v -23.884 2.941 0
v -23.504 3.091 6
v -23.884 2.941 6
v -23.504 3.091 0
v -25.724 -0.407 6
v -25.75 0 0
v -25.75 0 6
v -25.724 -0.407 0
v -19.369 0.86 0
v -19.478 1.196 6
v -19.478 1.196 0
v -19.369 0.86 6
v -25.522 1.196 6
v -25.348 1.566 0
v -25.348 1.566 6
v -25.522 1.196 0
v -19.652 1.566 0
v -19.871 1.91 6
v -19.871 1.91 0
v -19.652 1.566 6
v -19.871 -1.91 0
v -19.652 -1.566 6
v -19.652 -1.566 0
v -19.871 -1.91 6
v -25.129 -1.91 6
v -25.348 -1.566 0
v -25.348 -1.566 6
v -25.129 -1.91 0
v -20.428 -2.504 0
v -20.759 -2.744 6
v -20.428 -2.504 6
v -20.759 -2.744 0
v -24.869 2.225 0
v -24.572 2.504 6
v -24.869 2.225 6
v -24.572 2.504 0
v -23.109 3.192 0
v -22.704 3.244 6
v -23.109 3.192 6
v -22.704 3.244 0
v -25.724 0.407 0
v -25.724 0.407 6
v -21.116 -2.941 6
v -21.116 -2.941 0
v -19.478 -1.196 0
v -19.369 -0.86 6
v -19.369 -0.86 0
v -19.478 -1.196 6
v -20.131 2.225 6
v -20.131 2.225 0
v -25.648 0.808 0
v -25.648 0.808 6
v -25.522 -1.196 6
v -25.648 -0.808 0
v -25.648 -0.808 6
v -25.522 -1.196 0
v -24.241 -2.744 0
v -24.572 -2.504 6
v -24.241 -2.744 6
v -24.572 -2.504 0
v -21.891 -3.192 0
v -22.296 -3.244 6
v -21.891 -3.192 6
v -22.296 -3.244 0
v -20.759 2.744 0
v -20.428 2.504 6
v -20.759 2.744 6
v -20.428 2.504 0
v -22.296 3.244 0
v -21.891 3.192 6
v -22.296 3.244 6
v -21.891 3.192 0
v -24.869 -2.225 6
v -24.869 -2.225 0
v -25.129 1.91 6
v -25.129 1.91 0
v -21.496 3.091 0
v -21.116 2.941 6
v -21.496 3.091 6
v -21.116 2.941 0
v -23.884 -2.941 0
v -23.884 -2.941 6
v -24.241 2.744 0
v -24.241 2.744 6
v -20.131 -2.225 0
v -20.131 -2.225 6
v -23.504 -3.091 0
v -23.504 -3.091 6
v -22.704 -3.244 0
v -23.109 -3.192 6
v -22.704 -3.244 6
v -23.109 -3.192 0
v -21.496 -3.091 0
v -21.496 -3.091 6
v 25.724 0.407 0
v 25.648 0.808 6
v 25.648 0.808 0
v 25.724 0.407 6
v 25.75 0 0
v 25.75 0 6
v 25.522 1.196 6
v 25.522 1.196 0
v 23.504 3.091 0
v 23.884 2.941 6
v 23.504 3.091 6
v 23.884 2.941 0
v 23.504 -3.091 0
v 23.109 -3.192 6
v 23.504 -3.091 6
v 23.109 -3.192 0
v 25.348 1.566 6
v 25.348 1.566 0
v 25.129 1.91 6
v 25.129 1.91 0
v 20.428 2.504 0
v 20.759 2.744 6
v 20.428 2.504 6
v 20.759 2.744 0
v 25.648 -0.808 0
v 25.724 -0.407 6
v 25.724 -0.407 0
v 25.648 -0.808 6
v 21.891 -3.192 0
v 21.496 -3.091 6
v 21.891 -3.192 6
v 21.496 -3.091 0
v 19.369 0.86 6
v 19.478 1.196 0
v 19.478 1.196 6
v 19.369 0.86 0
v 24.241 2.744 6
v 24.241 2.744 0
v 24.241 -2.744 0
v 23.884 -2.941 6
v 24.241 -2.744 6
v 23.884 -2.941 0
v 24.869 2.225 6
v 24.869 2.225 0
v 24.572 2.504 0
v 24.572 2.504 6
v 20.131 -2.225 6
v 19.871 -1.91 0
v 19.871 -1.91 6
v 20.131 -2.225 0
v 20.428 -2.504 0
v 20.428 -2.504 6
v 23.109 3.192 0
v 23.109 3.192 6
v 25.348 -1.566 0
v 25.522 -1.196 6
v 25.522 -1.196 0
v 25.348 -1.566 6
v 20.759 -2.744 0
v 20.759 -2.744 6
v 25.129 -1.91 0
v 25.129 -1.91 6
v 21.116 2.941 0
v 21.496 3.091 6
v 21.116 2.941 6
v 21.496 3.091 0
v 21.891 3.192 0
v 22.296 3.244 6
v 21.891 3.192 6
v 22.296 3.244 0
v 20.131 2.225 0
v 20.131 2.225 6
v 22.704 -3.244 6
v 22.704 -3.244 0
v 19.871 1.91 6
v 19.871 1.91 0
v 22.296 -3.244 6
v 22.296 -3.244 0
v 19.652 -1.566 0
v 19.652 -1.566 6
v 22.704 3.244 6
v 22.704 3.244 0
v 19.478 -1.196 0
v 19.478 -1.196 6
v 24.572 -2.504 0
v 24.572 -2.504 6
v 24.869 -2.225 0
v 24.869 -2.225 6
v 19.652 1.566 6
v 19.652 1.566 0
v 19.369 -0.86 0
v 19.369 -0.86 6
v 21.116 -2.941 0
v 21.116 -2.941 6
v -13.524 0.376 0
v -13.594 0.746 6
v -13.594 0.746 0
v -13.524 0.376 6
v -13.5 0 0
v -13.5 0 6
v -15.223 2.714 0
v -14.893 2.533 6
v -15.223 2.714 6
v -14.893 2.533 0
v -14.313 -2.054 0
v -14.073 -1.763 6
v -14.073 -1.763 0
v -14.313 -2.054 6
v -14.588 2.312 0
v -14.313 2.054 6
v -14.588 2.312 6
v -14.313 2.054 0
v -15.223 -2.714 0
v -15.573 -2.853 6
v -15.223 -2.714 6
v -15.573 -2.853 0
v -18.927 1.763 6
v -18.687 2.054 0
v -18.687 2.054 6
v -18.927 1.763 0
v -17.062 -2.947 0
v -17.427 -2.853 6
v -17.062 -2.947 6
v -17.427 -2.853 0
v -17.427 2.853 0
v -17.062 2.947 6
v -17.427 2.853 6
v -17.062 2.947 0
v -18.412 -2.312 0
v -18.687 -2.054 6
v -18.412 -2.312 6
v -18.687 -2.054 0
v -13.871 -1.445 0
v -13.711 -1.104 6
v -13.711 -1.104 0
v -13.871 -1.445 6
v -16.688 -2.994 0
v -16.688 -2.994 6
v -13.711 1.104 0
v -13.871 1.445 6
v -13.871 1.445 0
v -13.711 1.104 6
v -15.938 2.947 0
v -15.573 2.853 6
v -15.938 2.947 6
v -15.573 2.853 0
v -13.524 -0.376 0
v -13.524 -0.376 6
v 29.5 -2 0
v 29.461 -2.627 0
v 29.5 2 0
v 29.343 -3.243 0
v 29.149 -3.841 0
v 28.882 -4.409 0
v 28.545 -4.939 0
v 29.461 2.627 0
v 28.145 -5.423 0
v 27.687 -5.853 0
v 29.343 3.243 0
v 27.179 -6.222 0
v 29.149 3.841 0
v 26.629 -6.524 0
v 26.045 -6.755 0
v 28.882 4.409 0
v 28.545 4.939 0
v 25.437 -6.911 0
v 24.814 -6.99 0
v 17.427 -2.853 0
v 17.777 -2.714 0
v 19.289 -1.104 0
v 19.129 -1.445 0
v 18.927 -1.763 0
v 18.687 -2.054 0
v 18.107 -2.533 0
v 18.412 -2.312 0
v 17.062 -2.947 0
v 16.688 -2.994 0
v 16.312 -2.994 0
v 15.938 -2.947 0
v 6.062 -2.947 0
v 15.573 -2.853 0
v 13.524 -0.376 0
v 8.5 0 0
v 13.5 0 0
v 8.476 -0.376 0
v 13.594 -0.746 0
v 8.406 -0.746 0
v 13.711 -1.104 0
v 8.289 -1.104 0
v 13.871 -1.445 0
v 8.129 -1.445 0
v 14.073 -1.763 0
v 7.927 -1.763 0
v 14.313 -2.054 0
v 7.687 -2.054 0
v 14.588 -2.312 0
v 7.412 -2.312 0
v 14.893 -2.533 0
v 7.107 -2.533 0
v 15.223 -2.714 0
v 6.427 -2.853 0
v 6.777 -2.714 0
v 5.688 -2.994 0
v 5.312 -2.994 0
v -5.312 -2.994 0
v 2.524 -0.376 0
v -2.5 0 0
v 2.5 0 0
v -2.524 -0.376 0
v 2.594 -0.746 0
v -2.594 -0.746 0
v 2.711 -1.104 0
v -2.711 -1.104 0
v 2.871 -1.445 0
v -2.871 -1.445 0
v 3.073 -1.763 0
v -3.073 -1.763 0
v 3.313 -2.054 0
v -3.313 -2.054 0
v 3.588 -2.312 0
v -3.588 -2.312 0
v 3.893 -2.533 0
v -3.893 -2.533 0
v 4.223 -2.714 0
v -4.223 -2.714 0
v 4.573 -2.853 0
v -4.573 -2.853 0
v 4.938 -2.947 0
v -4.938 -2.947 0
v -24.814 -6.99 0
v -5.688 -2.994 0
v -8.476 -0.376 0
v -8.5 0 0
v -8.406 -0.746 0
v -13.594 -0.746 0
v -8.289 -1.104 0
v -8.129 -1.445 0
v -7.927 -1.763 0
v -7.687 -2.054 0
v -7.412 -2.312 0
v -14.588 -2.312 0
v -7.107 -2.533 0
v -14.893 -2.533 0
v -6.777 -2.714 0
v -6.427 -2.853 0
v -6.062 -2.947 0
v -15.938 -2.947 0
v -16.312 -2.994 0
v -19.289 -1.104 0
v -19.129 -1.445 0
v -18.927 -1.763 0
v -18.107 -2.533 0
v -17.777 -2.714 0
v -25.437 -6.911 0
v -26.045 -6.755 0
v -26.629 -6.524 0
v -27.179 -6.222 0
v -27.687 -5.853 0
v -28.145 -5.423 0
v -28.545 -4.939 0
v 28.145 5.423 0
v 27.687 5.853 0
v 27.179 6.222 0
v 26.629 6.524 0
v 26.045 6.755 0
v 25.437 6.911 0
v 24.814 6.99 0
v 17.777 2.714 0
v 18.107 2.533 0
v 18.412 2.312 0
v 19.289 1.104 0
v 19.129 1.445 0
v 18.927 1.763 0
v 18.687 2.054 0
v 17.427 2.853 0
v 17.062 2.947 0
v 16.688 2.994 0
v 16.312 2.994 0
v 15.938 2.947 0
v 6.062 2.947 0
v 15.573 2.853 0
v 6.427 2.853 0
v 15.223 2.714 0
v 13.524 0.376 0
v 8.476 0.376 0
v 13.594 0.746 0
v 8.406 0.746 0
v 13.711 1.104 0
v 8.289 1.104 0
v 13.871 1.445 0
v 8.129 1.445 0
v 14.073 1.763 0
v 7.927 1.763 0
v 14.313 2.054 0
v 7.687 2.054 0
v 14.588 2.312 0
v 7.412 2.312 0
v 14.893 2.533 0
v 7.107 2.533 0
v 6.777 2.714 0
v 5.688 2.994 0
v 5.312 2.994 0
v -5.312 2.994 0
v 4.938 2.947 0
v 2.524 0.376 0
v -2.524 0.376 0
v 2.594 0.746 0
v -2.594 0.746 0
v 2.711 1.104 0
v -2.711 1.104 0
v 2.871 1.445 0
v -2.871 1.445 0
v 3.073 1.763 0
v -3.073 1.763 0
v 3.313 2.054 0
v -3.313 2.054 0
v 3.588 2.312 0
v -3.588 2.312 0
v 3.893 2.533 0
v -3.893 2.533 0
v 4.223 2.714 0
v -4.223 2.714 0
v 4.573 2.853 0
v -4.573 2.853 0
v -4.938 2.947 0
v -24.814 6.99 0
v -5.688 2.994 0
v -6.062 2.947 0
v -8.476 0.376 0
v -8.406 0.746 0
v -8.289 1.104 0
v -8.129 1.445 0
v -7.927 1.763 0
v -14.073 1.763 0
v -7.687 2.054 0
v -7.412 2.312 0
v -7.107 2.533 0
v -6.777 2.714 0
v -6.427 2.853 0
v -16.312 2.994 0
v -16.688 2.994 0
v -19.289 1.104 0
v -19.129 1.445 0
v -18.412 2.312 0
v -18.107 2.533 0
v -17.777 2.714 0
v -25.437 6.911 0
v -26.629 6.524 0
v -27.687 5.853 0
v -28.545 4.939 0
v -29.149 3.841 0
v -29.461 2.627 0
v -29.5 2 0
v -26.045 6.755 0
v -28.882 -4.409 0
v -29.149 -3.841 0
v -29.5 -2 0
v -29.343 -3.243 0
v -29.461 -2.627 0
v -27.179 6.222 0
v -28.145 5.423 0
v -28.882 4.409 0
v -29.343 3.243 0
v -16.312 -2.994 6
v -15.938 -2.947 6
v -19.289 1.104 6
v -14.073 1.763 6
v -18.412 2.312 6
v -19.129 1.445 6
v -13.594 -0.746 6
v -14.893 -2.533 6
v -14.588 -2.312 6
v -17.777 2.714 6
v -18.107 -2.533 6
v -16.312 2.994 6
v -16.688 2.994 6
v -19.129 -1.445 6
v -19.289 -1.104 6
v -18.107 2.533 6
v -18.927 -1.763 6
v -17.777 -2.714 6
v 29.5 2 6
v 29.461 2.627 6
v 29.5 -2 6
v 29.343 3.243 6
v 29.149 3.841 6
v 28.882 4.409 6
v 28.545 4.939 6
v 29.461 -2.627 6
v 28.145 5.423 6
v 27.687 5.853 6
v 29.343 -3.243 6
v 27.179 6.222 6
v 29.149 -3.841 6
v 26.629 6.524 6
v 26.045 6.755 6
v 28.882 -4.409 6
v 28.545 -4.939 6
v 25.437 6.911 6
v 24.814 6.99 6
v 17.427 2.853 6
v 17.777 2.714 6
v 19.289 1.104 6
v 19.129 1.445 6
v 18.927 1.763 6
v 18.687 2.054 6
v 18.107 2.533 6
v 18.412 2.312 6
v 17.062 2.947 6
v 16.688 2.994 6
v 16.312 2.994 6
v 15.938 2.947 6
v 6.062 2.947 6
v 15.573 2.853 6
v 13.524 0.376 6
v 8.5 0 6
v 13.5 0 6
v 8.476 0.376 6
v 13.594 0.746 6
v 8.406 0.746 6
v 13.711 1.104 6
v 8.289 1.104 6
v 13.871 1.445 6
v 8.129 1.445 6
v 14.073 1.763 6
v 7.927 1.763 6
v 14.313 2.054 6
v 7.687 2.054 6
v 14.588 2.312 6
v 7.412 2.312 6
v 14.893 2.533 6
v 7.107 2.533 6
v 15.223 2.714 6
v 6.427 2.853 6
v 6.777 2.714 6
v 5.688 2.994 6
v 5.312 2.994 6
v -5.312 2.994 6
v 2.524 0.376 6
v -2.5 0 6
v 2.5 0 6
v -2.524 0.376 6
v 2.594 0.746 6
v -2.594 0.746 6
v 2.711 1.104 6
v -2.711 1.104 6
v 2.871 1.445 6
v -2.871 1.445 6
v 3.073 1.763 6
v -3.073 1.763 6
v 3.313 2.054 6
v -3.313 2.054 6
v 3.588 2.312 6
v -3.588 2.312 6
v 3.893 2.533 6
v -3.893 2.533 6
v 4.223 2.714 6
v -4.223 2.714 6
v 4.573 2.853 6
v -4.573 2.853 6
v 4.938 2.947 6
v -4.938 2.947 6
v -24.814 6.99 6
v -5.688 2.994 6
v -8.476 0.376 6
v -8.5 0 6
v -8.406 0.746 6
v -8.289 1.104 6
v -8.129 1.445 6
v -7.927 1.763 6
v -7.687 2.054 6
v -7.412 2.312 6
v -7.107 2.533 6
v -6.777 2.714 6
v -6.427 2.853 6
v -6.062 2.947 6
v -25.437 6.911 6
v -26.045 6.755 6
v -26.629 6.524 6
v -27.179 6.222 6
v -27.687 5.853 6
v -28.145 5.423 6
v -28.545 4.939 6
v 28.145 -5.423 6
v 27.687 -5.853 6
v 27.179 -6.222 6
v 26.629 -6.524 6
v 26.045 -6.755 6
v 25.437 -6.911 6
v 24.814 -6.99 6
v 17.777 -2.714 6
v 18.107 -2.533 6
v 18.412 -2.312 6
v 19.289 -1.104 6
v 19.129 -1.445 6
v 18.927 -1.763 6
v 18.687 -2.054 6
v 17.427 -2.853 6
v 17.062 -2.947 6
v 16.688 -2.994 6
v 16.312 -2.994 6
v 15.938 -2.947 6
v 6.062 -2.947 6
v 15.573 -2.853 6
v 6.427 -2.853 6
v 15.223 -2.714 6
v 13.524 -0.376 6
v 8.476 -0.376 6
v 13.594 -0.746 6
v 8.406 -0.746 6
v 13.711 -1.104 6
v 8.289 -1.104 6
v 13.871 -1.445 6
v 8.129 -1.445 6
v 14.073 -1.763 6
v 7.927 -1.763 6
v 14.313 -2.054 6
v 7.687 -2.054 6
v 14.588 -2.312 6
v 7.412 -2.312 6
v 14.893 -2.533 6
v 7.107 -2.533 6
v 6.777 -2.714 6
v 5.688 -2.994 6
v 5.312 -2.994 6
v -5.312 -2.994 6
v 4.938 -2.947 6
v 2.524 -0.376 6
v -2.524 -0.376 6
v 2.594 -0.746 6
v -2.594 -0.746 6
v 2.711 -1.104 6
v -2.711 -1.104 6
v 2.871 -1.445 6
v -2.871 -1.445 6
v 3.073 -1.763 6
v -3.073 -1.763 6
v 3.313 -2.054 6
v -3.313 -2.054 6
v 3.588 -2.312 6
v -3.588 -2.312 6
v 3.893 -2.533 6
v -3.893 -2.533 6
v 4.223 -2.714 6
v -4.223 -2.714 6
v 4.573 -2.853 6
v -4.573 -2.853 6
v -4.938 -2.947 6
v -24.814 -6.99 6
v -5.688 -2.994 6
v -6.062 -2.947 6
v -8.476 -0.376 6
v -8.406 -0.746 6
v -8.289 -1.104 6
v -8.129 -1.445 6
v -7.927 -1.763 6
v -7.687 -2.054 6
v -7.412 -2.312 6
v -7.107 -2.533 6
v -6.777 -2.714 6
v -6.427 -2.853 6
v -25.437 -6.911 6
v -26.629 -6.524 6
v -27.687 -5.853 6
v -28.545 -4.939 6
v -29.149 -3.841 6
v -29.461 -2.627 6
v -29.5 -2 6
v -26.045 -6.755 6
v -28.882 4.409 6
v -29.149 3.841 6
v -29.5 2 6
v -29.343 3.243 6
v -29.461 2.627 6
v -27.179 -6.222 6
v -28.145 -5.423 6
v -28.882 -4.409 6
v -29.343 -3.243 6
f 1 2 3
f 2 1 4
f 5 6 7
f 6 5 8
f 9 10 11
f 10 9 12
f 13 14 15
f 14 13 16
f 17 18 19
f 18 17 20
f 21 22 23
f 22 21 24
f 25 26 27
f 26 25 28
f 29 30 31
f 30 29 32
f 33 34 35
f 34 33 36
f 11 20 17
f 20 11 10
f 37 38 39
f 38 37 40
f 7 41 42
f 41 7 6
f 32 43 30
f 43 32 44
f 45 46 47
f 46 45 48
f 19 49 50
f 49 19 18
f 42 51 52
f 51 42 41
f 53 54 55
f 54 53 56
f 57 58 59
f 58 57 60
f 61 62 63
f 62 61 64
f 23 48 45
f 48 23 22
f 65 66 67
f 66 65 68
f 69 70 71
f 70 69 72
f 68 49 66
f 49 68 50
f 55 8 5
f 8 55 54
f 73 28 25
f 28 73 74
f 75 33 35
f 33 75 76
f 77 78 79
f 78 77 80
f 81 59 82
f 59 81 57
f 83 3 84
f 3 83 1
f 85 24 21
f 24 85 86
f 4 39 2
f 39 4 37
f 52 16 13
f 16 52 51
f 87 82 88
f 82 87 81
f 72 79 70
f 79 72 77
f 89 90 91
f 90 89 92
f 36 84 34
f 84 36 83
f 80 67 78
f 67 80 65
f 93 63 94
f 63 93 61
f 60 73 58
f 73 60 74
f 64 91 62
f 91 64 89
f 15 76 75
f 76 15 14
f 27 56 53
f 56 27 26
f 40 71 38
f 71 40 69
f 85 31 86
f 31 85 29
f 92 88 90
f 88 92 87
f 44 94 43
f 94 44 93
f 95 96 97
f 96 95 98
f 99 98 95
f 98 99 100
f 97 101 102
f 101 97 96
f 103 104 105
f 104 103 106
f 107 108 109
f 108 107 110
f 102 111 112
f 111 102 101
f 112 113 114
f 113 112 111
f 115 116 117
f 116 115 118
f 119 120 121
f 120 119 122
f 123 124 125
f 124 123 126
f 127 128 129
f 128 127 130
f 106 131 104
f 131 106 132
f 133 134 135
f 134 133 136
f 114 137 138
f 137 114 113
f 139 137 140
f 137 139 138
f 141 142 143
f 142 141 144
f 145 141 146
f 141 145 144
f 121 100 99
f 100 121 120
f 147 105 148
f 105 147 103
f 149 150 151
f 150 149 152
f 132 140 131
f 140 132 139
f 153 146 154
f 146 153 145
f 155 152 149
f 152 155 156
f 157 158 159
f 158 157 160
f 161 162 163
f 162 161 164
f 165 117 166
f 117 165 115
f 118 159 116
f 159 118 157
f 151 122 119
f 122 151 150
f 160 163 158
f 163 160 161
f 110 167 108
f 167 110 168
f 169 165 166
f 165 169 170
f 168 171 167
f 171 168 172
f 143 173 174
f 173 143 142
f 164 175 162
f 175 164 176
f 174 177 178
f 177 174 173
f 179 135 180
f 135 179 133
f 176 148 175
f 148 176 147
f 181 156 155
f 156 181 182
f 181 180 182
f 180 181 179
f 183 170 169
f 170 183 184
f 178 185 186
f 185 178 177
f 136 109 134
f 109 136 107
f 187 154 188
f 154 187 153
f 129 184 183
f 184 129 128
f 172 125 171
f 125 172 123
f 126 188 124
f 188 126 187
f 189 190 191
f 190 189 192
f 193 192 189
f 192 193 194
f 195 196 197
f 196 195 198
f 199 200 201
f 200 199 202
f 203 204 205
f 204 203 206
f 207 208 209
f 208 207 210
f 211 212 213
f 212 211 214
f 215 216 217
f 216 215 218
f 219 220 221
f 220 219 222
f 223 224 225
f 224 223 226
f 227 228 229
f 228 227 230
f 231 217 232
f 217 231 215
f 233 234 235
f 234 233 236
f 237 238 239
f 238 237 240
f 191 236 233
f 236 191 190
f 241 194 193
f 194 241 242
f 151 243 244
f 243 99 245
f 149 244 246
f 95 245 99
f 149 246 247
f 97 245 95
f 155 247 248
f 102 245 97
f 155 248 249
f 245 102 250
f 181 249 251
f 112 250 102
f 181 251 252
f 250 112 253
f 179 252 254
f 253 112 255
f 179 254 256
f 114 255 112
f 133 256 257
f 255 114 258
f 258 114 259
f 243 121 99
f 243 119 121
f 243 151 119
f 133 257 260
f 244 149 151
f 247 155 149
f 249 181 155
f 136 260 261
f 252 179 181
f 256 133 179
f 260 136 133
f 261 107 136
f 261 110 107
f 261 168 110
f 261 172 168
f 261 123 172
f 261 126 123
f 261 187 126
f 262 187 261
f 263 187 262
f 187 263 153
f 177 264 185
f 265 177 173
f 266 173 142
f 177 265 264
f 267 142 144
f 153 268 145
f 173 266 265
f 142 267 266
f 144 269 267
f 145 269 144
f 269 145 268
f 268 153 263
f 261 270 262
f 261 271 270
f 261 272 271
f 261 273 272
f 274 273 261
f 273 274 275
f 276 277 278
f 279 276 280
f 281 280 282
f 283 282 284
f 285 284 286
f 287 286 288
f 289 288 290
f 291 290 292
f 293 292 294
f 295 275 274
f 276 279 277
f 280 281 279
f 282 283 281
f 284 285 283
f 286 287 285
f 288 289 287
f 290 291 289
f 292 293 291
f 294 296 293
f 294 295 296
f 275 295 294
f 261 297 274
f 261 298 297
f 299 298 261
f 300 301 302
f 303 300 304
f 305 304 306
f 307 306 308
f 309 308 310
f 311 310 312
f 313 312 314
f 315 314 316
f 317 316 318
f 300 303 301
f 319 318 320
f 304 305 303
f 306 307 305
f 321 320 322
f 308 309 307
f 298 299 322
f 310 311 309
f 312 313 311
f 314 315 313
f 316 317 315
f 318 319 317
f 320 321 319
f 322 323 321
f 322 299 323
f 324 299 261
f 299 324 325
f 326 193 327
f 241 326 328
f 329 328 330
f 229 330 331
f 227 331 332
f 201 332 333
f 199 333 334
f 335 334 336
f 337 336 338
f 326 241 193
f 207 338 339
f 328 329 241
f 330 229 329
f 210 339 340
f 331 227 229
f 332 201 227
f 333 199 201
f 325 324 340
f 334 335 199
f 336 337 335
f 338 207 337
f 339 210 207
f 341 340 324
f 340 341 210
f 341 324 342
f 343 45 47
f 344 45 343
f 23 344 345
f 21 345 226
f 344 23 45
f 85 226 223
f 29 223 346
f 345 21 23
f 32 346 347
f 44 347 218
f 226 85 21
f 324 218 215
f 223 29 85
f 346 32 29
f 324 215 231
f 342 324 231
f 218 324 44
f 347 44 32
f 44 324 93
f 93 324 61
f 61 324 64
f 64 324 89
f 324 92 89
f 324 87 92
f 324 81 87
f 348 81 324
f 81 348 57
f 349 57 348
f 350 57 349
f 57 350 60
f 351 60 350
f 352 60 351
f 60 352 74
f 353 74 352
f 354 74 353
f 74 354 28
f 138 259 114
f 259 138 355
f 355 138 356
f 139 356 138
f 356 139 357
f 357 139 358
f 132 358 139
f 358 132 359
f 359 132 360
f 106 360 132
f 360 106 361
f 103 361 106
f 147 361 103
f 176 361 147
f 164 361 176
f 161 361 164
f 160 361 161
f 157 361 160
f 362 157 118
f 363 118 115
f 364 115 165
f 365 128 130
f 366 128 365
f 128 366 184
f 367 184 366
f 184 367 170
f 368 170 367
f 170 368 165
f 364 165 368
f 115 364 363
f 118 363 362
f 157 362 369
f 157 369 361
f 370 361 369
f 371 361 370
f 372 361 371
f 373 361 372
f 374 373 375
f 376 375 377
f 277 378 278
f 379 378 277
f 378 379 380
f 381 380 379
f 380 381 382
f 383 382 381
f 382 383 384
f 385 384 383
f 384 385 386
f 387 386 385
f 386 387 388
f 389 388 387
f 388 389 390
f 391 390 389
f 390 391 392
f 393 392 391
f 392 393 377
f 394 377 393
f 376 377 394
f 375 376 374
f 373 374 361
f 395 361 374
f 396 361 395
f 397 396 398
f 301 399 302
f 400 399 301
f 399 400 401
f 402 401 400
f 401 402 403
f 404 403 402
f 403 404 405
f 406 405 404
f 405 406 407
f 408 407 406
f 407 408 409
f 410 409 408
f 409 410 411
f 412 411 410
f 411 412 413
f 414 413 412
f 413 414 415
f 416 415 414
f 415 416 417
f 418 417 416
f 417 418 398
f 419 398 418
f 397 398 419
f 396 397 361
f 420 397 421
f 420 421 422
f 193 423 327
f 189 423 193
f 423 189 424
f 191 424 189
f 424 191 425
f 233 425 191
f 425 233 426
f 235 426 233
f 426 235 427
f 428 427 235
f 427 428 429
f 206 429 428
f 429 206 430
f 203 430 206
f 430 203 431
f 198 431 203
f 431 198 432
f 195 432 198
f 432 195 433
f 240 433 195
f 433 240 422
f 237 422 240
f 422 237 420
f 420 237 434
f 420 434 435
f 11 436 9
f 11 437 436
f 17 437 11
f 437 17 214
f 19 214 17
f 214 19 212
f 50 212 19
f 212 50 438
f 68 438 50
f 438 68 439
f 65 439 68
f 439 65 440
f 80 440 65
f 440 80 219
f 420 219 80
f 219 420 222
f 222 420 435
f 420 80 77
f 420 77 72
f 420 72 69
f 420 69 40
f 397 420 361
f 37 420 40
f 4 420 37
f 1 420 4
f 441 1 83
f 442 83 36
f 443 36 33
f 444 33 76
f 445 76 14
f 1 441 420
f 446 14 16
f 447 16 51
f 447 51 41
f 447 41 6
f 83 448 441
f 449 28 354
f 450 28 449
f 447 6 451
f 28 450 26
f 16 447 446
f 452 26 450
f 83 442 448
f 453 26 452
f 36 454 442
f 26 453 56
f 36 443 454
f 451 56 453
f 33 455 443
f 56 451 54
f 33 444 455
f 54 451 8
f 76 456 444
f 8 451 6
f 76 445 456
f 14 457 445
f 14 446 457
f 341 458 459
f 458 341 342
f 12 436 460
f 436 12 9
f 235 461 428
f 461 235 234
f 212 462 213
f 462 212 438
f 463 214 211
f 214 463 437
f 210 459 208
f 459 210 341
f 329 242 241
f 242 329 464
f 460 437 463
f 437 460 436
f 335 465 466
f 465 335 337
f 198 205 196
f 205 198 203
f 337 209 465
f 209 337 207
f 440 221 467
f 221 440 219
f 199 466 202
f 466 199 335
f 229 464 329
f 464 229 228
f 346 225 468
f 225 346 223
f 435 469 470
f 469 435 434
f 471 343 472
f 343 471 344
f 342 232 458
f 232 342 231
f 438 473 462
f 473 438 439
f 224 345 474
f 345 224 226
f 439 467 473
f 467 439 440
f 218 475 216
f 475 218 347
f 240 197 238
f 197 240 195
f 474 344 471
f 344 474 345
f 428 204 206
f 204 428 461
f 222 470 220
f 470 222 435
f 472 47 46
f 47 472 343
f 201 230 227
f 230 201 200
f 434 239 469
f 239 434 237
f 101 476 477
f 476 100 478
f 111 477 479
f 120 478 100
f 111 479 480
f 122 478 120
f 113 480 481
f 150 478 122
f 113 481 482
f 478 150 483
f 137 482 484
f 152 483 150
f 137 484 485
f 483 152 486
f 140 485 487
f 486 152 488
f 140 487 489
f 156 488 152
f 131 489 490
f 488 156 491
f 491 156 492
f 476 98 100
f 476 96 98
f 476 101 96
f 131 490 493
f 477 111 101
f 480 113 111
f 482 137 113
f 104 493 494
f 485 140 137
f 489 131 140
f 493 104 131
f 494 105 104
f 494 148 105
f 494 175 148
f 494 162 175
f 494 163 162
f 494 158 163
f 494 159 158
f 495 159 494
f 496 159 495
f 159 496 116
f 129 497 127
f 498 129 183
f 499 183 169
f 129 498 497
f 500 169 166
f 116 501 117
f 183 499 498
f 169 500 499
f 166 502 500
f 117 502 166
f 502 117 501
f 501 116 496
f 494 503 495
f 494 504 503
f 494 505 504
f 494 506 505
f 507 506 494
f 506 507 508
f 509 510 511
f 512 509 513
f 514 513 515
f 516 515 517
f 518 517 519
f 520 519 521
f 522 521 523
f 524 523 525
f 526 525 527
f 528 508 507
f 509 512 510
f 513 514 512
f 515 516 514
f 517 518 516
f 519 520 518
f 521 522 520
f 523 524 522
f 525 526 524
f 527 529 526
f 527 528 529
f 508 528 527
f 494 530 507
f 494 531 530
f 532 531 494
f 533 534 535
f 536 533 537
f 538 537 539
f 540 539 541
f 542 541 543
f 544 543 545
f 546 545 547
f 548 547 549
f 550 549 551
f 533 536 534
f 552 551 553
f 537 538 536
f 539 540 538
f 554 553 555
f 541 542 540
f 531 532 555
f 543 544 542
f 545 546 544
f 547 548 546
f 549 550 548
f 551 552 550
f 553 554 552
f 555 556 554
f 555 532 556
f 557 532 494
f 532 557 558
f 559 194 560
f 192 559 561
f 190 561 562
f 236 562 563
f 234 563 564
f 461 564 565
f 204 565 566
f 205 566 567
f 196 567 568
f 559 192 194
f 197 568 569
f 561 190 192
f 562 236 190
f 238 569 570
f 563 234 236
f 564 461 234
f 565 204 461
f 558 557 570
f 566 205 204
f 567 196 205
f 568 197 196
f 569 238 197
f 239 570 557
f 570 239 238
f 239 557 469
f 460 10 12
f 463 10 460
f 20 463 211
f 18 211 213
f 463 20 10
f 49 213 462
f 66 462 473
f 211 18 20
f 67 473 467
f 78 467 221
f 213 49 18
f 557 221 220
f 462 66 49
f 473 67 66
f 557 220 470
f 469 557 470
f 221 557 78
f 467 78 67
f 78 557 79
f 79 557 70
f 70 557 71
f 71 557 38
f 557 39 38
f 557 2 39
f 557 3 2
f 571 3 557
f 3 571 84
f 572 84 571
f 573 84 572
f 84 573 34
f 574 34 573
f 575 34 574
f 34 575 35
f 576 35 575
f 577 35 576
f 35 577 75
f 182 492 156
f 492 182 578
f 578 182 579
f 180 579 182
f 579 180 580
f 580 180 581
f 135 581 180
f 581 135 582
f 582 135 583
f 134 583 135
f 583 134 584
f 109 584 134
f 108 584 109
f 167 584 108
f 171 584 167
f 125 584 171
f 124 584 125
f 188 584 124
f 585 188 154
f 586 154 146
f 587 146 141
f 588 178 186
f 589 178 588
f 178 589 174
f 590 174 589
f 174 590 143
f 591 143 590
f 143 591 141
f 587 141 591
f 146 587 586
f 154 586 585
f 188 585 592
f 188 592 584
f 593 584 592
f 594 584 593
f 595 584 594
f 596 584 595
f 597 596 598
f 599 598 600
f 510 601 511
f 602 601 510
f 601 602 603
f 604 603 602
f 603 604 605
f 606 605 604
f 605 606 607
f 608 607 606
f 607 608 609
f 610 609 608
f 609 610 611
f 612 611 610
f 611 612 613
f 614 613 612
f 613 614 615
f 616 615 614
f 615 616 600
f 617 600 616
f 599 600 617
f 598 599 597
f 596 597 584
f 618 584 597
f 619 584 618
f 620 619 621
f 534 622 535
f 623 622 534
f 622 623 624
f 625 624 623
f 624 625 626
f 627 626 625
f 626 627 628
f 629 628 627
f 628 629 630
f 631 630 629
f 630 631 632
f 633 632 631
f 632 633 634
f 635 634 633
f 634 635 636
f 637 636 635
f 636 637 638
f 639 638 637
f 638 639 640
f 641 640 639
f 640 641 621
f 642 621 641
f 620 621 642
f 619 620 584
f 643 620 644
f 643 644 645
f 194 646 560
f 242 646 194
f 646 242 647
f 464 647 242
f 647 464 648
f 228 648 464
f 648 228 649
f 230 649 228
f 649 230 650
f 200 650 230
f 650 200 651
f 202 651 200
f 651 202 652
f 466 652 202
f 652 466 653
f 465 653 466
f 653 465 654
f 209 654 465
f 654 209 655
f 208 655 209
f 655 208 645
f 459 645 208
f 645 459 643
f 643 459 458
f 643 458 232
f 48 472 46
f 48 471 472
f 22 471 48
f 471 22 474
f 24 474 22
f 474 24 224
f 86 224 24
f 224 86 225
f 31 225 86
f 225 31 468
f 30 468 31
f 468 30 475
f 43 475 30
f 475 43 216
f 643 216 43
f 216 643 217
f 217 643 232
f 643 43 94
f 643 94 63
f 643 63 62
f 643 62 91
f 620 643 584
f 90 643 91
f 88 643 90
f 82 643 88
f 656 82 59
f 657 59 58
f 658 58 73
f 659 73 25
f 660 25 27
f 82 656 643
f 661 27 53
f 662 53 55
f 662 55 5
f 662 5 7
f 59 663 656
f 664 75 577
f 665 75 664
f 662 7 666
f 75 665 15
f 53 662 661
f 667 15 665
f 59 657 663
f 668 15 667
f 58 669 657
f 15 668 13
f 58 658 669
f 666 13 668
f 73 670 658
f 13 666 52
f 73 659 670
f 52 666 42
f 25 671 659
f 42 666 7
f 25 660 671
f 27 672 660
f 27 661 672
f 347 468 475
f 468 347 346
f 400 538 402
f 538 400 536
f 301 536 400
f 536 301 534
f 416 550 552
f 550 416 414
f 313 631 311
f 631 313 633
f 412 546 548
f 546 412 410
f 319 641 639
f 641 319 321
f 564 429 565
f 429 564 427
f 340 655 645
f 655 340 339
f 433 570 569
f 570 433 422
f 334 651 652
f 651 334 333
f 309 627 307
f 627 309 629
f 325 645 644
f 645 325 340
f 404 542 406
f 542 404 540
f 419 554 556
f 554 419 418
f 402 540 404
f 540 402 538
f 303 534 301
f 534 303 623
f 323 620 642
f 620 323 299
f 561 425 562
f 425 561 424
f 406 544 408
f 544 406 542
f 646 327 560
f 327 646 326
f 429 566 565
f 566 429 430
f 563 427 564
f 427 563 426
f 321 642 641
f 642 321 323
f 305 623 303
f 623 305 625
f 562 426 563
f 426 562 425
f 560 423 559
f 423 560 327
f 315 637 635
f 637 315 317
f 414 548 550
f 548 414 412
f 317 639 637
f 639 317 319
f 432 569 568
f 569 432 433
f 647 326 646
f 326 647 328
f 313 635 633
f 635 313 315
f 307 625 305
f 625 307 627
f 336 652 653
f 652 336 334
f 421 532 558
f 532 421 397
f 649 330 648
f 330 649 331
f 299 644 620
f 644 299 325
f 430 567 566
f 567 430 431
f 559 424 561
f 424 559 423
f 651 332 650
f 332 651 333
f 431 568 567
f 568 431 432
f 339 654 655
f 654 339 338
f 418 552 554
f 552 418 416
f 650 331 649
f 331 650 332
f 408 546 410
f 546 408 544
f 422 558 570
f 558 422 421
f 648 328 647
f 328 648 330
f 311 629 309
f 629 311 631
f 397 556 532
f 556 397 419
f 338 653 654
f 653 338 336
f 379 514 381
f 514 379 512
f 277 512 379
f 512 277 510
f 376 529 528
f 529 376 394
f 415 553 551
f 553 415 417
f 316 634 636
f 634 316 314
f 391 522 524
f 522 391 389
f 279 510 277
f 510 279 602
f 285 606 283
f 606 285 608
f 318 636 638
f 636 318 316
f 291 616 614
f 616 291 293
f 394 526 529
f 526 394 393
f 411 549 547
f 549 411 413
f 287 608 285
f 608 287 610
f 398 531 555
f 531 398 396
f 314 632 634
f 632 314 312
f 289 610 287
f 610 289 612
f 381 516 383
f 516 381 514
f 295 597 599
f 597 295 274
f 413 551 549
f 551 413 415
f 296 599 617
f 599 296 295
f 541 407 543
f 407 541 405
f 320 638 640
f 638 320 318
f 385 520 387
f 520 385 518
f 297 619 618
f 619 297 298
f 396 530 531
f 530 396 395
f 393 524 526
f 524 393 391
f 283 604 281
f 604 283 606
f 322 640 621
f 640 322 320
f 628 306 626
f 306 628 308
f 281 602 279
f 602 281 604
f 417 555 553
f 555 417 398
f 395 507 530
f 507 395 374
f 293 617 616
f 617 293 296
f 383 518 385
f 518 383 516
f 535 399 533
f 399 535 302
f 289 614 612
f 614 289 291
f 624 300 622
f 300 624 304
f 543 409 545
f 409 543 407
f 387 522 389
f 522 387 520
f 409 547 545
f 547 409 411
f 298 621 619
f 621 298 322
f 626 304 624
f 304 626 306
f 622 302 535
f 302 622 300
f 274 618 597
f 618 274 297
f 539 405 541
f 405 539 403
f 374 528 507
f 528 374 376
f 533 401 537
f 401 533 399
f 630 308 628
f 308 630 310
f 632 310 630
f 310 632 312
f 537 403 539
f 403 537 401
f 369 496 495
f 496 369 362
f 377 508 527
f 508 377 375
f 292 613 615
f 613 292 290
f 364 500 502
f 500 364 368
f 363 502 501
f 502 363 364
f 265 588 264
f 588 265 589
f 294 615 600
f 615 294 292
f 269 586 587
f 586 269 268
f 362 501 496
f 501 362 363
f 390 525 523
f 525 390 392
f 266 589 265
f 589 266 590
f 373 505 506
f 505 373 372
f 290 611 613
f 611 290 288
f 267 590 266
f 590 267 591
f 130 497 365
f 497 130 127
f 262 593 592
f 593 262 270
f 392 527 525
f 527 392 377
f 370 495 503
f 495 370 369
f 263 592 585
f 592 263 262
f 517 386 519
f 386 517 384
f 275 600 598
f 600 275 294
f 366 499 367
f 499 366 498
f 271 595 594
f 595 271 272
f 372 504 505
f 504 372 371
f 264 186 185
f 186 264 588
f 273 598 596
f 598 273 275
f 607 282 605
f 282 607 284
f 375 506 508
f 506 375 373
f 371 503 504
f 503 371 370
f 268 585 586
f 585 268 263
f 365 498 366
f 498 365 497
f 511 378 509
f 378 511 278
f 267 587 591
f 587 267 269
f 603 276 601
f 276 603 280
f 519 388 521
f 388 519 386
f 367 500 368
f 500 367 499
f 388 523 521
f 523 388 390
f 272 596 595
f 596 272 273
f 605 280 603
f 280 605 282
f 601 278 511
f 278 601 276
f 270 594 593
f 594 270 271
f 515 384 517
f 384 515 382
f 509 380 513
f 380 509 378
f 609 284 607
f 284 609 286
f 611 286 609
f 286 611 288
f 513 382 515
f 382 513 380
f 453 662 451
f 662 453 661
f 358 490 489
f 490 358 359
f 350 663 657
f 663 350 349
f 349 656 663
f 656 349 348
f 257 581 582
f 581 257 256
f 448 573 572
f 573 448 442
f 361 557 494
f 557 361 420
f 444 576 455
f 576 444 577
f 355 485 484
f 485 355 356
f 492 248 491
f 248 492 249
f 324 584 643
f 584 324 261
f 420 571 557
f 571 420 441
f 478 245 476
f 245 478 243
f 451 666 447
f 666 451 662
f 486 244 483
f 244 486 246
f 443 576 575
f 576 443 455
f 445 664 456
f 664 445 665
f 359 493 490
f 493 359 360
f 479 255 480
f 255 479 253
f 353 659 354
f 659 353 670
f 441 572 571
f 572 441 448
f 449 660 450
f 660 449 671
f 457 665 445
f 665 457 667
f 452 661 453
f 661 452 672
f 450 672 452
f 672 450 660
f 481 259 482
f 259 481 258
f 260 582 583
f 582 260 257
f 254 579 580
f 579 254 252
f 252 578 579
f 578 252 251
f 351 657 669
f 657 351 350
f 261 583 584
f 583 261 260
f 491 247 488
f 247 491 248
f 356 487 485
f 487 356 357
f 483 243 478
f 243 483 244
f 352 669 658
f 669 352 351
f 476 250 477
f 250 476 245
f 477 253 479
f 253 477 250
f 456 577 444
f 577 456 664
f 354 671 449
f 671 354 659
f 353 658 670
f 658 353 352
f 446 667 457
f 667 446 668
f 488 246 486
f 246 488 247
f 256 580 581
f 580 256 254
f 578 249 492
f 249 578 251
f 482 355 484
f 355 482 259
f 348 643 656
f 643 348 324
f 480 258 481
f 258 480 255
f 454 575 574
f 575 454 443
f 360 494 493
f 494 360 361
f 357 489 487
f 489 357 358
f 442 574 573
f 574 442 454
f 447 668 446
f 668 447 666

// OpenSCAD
$fn = 50;


difference() {
	union() {
		hull() {
			translate(v = [-24.5000000000, 2.0000000000, 0]) {
				cylinder(h = 6, r = 5);
			}
			translate(v = [24.5000000000, 2.0000000000, 0]) {
				cylinder(h = 6, r = 5);
			}
			translate(v = [-24.5000000000, -2.0000000000, 0]) {
				cylinder(h = 6, r = 5);
			}
			translate(v = [24.5000000000, -2.0000000000, 0]) {
				cylinder(h = 6, r = 5);
			}
		}
	}
	union() {
		#translate(v = [-22.5000000000, 0.0000000000, -100.0000000000]) {
			cylinder(h = 200, r = 3.2500000000);
		}
		#translate(v = [-22.5000000000, 0.0000000000, -100.0000000000]) {
			cylinder(h = 200, r = 3.2500000000);
		}
		#translate(v = [22.5000000000, 0.0000000000, -100.0000000000]) {
			cylinder(h = 200, r = 3.2500000000);
		}
		#translate(v = [22.5000000000, 0.0000000000, -100.0000000000]) {
			cylinder(h = 200, r = 3.2500000000);
		}
		#translate(v = [-16.5000000000, 0, 0]) {
			cylinder(h = 6, r = 3.0000000000);
		}
		#translate(v = [-5.5000000000, 0, 0]) {
			cylinder(h = 6, r = 3.0000000000);
		}
		#translate(v = [5.5000000000, 0, 0]) {
			cylinder(h = 6, r = 3.0000000000);
		}
		#translate(v = [16.5000000000, 0, 0]) {
			cylinder(h = 6, r = 3.0000000000);
		}
	}
}
